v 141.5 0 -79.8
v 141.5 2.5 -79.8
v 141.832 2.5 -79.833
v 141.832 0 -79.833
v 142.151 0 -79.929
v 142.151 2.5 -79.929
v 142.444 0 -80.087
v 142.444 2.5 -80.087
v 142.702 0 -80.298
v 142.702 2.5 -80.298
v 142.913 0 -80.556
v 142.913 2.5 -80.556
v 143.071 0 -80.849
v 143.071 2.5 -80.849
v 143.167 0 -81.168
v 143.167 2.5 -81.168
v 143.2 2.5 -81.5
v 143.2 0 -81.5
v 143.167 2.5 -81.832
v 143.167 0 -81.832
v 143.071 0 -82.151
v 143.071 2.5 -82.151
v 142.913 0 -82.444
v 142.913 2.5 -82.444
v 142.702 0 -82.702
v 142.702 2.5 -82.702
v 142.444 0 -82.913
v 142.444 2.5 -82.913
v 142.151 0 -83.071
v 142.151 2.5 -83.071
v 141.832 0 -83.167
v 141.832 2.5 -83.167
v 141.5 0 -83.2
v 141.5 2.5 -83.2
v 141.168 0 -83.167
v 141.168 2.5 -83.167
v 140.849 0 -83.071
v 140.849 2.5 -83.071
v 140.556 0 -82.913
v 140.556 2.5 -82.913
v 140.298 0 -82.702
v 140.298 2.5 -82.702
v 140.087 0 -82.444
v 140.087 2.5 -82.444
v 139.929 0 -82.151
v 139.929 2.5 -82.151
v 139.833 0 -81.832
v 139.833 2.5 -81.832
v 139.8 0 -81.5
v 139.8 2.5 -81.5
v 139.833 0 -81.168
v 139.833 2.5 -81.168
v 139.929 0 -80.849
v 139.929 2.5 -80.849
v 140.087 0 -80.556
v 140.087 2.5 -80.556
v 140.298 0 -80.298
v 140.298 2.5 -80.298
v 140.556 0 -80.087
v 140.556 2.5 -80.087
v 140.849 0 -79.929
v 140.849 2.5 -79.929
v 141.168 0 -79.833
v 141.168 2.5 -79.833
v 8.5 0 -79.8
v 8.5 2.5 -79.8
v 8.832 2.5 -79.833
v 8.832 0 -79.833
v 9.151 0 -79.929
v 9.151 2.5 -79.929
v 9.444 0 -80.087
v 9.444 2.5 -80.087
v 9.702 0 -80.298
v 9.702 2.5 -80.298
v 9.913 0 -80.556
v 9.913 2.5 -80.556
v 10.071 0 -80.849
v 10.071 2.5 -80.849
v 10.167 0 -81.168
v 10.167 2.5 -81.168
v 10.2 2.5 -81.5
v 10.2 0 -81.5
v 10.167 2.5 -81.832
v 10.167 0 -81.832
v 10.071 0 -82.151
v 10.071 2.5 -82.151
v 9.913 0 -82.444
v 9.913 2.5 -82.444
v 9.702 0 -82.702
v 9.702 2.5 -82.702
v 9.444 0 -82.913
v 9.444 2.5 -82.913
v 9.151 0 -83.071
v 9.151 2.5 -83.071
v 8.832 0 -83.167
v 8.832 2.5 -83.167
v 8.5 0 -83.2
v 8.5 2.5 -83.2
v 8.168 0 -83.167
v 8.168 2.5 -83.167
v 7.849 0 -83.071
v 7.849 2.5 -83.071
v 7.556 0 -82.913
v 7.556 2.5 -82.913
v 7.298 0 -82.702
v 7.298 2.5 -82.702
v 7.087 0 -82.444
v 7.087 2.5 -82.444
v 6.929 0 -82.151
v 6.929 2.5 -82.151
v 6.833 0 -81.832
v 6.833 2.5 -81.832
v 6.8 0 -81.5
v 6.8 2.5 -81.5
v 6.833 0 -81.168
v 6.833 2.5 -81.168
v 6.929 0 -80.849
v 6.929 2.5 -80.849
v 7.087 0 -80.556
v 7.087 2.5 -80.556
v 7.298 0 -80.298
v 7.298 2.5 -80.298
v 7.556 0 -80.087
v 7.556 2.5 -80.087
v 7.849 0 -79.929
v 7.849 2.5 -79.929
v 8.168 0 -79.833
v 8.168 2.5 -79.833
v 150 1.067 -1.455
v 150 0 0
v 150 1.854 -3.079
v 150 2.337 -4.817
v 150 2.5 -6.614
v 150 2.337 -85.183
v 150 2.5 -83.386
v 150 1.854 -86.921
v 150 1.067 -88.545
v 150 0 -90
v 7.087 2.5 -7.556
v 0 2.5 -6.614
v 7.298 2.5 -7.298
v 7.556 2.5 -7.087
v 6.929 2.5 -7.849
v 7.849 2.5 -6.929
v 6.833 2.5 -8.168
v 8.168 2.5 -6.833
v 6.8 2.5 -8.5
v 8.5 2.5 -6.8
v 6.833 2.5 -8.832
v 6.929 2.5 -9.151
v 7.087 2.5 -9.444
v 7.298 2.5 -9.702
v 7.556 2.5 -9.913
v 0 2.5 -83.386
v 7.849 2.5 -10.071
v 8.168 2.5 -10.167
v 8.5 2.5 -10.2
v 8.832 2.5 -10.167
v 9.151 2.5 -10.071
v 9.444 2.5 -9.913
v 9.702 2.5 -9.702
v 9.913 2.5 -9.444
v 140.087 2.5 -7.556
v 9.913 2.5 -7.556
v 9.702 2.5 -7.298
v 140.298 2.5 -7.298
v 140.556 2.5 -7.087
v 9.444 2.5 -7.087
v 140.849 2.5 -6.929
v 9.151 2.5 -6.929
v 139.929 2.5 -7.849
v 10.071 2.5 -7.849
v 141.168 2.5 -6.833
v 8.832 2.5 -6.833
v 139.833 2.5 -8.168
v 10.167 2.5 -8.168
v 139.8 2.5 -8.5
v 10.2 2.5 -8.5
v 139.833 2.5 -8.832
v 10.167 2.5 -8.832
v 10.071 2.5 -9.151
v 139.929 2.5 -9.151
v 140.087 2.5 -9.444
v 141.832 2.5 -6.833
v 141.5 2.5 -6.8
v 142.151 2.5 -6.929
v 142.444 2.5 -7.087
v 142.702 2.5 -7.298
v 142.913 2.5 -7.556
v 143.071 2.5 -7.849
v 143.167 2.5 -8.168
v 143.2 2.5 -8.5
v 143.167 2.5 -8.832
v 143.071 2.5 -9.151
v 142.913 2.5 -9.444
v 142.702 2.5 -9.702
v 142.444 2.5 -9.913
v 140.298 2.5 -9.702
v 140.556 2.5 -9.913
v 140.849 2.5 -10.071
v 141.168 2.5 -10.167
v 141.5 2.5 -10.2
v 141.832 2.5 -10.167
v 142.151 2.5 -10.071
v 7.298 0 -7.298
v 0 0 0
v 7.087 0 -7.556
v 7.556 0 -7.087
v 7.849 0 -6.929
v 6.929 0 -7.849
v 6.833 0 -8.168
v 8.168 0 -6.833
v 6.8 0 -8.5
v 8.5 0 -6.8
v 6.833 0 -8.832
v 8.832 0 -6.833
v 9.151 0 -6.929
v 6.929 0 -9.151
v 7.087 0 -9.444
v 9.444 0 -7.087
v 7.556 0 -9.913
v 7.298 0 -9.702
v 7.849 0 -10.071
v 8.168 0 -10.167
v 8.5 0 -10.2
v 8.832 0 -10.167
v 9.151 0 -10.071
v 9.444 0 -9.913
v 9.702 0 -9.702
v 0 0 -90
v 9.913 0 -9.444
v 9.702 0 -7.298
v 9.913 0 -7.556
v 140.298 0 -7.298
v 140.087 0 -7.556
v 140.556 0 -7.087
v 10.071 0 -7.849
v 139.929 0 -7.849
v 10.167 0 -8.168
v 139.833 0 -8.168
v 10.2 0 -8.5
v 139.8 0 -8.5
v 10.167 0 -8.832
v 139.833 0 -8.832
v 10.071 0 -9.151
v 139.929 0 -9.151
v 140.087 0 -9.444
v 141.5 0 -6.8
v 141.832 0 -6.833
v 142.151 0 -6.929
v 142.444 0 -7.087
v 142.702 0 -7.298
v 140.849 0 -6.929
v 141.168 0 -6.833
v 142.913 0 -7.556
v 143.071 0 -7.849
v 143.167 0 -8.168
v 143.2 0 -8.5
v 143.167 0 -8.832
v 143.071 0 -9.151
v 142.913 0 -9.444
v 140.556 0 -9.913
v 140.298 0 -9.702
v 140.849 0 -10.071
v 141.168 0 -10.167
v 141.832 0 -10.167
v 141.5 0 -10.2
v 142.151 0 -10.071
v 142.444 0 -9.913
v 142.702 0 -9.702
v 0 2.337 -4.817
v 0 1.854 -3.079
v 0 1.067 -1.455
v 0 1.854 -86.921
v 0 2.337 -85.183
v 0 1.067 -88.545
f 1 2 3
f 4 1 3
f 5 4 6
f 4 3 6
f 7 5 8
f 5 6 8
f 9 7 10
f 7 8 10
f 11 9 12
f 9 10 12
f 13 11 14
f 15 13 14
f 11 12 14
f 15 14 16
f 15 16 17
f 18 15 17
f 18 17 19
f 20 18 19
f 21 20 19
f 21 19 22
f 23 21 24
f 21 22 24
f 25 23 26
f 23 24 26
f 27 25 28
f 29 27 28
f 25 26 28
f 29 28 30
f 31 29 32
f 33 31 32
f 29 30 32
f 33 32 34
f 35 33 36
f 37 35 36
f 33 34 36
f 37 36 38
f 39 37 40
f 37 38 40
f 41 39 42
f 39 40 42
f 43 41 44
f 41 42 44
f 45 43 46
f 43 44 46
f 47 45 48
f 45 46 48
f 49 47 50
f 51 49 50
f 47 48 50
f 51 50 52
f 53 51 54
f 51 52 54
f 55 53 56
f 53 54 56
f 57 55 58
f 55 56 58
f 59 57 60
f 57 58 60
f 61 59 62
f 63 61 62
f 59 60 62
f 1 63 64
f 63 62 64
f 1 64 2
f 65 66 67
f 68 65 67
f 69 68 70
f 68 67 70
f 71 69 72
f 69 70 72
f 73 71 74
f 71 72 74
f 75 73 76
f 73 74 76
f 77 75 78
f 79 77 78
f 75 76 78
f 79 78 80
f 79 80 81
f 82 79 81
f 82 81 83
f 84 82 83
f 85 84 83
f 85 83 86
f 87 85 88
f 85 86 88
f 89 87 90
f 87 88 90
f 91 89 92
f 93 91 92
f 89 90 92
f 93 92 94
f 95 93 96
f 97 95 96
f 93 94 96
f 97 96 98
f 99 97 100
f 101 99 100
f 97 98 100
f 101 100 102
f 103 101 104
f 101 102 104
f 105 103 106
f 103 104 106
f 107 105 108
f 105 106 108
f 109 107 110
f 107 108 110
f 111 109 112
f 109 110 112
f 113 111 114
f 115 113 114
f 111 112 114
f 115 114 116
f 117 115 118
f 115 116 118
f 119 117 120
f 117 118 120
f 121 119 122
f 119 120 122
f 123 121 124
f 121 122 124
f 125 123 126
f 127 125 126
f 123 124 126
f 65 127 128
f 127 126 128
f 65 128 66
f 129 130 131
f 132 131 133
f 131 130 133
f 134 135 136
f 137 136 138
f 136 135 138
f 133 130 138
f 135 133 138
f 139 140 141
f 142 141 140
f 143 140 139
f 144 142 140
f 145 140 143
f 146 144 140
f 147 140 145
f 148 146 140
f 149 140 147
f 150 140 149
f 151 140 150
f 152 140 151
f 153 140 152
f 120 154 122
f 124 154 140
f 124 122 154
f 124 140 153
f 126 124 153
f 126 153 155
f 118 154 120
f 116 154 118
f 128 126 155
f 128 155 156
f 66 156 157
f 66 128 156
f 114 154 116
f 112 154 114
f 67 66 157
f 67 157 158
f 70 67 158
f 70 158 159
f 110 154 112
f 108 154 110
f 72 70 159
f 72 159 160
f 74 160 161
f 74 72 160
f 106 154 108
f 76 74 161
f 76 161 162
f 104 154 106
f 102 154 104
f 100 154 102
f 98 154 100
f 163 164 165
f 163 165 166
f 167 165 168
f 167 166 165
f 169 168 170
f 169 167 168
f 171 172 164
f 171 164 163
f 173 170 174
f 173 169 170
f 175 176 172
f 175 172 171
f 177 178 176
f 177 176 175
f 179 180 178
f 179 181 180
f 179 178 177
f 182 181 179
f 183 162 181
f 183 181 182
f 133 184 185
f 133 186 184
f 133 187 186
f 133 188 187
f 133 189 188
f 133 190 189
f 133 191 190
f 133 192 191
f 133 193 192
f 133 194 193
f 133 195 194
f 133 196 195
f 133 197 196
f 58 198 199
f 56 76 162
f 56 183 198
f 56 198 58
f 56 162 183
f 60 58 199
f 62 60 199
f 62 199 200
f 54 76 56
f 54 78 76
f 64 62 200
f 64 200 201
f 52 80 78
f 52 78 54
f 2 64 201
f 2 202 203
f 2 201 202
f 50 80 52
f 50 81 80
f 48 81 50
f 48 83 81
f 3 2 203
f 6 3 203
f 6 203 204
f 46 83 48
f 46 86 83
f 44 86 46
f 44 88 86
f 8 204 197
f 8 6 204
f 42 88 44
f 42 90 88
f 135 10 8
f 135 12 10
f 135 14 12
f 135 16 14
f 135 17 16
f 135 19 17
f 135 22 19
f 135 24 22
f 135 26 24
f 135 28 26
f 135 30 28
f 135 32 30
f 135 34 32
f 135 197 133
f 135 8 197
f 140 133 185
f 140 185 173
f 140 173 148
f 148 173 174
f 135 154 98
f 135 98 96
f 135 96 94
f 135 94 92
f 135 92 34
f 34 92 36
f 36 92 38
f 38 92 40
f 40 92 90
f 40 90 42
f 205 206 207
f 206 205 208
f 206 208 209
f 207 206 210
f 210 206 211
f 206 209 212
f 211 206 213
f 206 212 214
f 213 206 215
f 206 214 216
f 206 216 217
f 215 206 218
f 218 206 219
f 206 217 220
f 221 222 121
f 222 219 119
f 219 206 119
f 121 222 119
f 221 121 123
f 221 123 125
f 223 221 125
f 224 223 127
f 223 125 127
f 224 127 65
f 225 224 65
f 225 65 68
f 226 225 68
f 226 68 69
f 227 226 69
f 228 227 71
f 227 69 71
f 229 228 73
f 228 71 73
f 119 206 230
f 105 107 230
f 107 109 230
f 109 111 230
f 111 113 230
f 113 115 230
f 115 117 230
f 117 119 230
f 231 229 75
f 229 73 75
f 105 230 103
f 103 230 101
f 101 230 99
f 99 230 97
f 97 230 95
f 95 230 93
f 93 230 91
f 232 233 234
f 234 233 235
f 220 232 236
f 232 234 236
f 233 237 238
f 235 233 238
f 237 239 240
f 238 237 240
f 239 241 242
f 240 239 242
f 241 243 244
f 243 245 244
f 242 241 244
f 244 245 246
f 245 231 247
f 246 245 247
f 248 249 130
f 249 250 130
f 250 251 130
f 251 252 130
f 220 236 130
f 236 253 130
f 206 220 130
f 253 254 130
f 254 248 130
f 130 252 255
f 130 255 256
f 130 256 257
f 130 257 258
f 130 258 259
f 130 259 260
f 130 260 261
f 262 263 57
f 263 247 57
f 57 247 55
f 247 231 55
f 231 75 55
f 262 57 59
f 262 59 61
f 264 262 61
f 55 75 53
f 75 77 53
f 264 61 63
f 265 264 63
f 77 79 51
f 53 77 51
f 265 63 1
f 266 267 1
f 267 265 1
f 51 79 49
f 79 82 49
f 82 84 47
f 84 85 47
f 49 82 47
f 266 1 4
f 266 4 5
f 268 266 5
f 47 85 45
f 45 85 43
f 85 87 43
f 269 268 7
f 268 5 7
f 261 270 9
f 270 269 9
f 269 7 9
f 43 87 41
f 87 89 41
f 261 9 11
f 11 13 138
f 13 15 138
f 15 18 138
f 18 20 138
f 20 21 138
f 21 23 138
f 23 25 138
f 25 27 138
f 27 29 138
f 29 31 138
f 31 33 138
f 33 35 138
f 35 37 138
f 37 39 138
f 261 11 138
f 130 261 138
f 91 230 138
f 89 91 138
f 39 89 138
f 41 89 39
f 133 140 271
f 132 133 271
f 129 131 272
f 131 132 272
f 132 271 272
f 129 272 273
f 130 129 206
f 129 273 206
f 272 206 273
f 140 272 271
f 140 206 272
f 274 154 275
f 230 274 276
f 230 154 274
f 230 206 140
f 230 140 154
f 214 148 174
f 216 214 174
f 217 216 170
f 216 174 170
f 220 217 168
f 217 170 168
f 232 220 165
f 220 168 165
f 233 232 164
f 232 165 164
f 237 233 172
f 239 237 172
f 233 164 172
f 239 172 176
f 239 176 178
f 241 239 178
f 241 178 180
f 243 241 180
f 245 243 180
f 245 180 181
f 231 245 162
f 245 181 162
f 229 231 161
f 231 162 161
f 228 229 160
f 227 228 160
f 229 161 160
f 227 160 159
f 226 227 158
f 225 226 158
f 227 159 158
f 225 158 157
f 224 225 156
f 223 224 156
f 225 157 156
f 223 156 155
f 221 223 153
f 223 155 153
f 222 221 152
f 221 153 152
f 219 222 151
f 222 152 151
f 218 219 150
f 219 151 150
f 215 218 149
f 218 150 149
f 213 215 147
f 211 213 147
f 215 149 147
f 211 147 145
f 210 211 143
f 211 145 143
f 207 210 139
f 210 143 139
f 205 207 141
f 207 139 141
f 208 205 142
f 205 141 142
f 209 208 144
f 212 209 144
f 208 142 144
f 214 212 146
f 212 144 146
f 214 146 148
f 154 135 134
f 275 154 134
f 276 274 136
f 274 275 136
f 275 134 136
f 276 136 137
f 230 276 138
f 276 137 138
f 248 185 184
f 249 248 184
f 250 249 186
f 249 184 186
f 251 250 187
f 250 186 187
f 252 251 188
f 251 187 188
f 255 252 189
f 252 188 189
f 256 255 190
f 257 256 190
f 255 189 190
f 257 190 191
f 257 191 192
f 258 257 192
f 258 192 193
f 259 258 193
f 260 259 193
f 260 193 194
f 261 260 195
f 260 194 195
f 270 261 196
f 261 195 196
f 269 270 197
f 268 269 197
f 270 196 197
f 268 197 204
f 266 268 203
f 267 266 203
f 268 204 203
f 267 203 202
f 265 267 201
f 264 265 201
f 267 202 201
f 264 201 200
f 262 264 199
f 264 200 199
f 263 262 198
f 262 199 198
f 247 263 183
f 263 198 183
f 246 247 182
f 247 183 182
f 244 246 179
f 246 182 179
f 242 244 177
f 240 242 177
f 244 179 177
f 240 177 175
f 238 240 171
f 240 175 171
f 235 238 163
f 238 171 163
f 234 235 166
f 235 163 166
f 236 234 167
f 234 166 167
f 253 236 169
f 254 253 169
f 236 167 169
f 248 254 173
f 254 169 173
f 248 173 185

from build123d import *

# Parameters (mm, degrees)
SKETCH1_W           = 150
SKETCH1_H           = 90
BOSS_EXTRUDE1_DEPTH = 2.5
FILLET1_R           = 10
FILLET2_R           = 10
SKETCH2_R           = 1.7
CUT_EXTRUDE1_DEPTH  = 2.5


with BuildPart() as part:
    # Sketch1 → Boss-Extrude1 (new body)
    with BuildSketch(Plane(origin=(0, 0, 0), x_dir=(1, 0, 0), z_dir=(0, 1, 0))):
        with Locations((75, 45)):
            Rectangle(SKETCH1_W, SKETCH1_H)
    extrude(amount=BOSS_EXTRUDE1_DEPTH)

    # Fillet1
    # the kernel refuses this fillet: 10 mm, written as the material it takes off along each edge
    with BuildSketch(Plane(origin=(-16.535945694, 2.5, 0), x_dir=(0, -1, 0), z_dir=(1, 0, 0))) as fillet1_piece_1:
        with BuildLine():
            CenterArc((10, 6.614378278), FILLET1_R, 180, 41.409622109)
            Line((0, 6.614378278), (-0.2, 6.614378278))
            Line((-0.2, 6.614378278), (-0.2, 0))
            Line((-0.2, 0), (0, -0.2))
            ThreePointArc((0, -0.2), (1.25, -0.2), (2.35, -0.132287566))
            Line((2.35, -0.132287566), (2.5, 0))
        make_face()
    extrude(amount=183.071891388, mode=Mode.SUBTRACT)

    # Fillet2
    # the kernel refuses this fillet: 10 mm, written as the material it takes off along each edge
    with BuildSketch(Plane(origin=(166.535945694, 2.5, -90), x_dir=(0, -1, 0), z_dir=(-1, 0, 0))) as fillet2_piece_1:
        with BuildLine():
            CenterArc((10, 6.614378278), FILLET2_R, 180, 41.409622109)
            Line((0, 6.614378278), (-0.2, 6.614378278))
            Line((-0.2, 6.614378278), (-0.2, 0))
            Line((-0.2, 0), (0, -0.2))
            ThreePointArc((0, -0.2), (1.25, -0.2), (2.35, -0.132287566))
            Line((2.35, -0.132287566), (2.5, 0))
        make_face()
    extrude(amount=183.071891388, mode=Mode.SUBTRACT)

    # Sketch2 → Cut-Extrude1 (cut)
    with BuildSketch(Plane(origin=(0, 2.5, 0), x_dir=(1, 0, 0), z_dir=(0, 1, 0))):
        with Locations(Location((8.5, 81.5, 0), (0, 0, 270))):
            Circle(SKETCH2_R)
        with Locations(Location((8.5, 8.5, 0), (0, 0, 270))):
            Circle(SKETCH2_R)
        with Locations(Location((141.5, 81.5, 0), (0, 0, 270))):
            Circle(SKETCH2_R)
        with Locations(Location((141.5, 8.5, 0), (0, 0, 270))):
            Circle(SKETCH2_R)
    extrude(amount=-CUT_EXTRUDE1_DEPTH, mode=Mode.SUBTRACT)


solid = part.part
